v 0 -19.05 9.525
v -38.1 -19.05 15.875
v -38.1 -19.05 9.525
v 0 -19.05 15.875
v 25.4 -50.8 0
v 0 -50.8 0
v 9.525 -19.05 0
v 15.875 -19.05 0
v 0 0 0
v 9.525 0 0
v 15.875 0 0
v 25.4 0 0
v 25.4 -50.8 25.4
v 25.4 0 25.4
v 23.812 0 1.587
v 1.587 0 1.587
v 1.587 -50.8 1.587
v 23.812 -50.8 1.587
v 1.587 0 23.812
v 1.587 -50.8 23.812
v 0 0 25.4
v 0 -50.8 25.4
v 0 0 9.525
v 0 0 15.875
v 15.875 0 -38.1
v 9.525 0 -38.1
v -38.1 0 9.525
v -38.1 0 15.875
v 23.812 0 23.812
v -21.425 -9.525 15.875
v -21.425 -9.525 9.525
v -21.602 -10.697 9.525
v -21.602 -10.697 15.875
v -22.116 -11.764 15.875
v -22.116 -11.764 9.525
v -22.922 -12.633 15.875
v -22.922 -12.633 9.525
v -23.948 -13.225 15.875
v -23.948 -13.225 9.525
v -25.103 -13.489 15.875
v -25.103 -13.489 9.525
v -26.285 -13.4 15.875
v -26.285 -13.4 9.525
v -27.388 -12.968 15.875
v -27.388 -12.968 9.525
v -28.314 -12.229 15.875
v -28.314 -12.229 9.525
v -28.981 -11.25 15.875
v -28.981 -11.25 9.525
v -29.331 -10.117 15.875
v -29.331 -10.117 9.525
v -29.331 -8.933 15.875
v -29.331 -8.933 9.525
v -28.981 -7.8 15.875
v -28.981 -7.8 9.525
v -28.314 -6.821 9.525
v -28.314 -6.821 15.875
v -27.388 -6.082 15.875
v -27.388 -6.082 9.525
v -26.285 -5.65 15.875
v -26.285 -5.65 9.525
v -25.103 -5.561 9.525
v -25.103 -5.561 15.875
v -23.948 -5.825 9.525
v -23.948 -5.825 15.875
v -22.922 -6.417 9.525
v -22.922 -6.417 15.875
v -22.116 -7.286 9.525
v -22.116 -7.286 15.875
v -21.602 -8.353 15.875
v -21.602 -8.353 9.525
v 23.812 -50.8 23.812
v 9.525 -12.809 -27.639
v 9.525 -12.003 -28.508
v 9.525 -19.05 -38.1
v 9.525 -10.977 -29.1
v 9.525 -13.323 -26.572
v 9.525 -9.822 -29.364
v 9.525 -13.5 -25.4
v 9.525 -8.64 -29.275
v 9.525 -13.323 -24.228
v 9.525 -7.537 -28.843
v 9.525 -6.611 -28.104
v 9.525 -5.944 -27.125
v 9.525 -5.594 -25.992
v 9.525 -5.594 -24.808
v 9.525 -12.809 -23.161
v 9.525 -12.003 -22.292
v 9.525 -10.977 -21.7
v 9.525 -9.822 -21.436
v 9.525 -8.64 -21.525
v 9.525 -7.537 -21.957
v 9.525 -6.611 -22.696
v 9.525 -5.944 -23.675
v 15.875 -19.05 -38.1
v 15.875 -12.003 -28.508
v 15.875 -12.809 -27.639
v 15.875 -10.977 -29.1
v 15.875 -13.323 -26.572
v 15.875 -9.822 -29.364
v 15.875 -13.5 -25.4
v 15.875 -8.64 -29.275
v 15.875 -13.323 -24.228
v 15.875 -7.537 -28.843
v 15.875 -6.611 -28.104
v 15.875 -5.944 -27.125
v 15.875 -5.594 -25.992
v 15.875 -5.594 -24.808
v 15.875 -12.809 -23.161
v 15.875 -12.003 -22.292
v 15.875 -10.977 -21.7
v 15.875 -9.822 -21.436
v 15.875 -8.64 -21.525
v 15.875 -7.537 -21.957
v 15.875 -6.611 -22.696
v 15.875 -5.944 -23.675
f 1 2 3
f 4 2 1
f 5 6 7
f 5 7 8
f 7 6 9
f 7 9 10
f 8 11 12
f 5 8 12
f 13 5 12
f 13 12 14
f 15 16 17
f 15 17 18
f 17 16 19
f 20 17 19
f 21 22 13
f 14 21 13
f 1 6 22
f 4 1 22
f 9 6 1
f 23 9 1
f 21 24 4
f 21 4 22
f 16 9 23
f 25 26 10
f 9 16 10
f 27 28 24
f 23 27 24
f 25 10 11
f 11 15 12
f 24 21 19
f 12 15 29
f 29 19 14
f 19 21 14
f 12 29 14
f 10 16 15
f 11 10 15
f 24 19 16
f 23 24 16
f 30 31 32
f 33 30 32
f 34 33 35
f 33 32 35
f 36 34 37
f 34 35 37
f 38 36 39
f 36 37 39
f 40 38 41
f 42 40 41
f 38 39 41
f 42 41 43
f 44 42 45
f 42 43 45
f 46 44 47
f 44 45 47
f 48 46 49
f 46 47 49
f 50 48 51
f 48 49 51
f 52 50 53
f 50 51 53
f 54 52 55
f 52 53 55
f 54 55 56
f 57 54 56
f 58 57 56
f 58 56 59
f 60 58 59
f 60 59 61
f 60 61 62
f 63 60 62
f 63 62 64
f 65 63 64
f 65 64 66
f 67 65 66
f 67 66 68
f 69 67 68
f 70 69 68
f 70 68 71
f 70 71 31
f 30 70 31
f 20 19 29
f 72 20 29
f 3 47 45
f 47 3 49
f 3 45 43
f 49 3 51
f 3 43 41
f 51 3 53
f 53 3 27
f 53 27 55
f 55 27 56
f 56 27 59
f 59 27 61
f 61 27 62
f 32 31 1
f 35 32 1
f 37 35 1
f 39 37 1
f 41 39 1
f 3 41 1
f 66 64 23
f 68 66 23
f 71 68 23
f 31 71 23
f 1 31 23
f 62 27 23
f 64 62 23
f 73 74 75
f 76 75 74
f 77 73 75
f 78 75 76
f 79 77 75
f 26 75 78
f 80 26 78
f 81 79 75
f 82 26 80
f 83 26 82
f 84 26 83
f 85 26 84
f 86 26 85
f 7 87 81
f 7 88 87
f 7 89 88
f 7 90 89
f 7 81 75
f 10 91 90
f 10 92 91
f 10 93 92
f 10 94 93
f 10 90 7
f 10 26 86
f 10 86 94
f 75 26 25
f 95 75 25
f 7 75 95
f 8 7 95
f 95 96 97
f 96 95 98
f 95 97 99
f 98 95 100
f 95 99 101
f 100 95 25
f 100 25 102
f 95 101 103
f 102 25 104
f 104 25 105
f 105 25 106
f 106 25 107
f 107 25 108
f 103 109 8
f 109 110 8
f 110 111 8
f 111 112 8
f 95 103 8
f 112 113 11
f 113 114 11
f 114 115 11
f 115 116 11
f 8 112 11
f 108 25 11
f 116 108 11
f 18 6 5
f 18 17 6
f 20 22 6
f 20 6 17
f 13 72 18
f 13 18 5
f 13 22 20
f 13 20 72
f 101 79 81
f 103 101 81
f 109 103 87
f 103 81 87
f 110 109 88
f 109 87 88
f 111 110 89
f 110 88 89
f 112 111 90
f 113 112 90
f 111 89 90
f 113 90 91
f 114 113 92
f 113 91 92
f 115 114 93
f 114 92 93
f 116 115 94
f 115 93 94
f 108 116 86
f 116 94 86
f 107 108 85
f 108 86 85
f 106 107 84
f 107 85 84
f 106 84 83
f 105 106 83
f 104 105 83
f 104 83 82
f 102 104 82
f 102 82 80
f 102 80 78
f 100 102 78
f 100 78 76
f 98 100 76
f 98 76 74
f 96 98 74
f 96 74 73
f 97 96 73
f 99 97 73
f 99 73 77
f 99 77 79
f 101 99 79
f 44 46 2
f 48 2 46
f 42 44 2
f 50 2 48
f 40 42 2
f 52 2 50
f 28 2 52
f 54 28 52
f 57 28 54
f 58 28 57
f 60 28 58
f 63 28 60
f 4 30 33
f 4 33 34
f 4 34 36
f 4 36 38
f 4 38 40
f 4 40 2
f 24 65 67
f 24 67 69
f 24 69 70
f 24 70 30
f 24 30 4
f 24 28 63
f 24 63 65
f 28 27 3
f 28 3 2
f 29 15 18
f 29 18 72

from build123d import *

# Parameters (mm, degrees)
F0_W     = 25.4
F0_H     = 25.4
F0_W_2   = 22.225
F0_H_2   = 22.225
F1_DEPTH = 50.8
F2_W     = 6.35
F2_H     = 38.1
F2_W_2   = 38.1
F2_H_2   = 6.35
F3_DEPTH = 19.05
F4_R     = 3.9751
F5_DEPTH = 25.4
F6_R     = 3.9751
F7_DEPTH = 25.4


with BuildPart() as f1:
    # F0 (on Front) → F1 (new body)
    with BuildSketch(Plane.XZ):
        with Locations((12.7, 12.7)):
            Rectangle(F0_W, F0_H)
        with Locations((12.7, 12.7)):
            Rectangle(F0_W_2, F0_H_2, mode=Mode.SUBTRACT)
    extrude(amount=F1_DEPTH)

    # F2 (on Front) → F3 (join)
    with BuildSketch(Plane.XZ):
        with Locations((12.7, -19.05)):
            Rectangle(F2_W, F2_H)
        with Locations((-19.05, 12.7)):
            Rectangle(F2_W_2, F2_H_2)
    extrude(amount=F3_DEPTH)

    # F4 (on face) → F5 (cut)
    with BuildSketch(Plane(origin=(9.525, 0, 0), x_dir=(0, -1, 0), z_dir=(-1, 0, 0))):
        with Locations((9.525, -25.4)):
            Circle(F4_R)
    extrude(amount=-F5_DEPTH, mode=Mode.SUBTRACT)

    # F6 (on face) → F7 (cut)
    with BuildSketch(Plane(origin=(0, 0, 9.525), x_dir=(1, 0, 0), z_dir=(0, 0, -1))):
        with Locations((-25.4, 9.525)):
            Circle(F6_R)
    extrude(amount=-F7_DEPTH, mode=Mode.SUBTRACT)


solid = f1.part
